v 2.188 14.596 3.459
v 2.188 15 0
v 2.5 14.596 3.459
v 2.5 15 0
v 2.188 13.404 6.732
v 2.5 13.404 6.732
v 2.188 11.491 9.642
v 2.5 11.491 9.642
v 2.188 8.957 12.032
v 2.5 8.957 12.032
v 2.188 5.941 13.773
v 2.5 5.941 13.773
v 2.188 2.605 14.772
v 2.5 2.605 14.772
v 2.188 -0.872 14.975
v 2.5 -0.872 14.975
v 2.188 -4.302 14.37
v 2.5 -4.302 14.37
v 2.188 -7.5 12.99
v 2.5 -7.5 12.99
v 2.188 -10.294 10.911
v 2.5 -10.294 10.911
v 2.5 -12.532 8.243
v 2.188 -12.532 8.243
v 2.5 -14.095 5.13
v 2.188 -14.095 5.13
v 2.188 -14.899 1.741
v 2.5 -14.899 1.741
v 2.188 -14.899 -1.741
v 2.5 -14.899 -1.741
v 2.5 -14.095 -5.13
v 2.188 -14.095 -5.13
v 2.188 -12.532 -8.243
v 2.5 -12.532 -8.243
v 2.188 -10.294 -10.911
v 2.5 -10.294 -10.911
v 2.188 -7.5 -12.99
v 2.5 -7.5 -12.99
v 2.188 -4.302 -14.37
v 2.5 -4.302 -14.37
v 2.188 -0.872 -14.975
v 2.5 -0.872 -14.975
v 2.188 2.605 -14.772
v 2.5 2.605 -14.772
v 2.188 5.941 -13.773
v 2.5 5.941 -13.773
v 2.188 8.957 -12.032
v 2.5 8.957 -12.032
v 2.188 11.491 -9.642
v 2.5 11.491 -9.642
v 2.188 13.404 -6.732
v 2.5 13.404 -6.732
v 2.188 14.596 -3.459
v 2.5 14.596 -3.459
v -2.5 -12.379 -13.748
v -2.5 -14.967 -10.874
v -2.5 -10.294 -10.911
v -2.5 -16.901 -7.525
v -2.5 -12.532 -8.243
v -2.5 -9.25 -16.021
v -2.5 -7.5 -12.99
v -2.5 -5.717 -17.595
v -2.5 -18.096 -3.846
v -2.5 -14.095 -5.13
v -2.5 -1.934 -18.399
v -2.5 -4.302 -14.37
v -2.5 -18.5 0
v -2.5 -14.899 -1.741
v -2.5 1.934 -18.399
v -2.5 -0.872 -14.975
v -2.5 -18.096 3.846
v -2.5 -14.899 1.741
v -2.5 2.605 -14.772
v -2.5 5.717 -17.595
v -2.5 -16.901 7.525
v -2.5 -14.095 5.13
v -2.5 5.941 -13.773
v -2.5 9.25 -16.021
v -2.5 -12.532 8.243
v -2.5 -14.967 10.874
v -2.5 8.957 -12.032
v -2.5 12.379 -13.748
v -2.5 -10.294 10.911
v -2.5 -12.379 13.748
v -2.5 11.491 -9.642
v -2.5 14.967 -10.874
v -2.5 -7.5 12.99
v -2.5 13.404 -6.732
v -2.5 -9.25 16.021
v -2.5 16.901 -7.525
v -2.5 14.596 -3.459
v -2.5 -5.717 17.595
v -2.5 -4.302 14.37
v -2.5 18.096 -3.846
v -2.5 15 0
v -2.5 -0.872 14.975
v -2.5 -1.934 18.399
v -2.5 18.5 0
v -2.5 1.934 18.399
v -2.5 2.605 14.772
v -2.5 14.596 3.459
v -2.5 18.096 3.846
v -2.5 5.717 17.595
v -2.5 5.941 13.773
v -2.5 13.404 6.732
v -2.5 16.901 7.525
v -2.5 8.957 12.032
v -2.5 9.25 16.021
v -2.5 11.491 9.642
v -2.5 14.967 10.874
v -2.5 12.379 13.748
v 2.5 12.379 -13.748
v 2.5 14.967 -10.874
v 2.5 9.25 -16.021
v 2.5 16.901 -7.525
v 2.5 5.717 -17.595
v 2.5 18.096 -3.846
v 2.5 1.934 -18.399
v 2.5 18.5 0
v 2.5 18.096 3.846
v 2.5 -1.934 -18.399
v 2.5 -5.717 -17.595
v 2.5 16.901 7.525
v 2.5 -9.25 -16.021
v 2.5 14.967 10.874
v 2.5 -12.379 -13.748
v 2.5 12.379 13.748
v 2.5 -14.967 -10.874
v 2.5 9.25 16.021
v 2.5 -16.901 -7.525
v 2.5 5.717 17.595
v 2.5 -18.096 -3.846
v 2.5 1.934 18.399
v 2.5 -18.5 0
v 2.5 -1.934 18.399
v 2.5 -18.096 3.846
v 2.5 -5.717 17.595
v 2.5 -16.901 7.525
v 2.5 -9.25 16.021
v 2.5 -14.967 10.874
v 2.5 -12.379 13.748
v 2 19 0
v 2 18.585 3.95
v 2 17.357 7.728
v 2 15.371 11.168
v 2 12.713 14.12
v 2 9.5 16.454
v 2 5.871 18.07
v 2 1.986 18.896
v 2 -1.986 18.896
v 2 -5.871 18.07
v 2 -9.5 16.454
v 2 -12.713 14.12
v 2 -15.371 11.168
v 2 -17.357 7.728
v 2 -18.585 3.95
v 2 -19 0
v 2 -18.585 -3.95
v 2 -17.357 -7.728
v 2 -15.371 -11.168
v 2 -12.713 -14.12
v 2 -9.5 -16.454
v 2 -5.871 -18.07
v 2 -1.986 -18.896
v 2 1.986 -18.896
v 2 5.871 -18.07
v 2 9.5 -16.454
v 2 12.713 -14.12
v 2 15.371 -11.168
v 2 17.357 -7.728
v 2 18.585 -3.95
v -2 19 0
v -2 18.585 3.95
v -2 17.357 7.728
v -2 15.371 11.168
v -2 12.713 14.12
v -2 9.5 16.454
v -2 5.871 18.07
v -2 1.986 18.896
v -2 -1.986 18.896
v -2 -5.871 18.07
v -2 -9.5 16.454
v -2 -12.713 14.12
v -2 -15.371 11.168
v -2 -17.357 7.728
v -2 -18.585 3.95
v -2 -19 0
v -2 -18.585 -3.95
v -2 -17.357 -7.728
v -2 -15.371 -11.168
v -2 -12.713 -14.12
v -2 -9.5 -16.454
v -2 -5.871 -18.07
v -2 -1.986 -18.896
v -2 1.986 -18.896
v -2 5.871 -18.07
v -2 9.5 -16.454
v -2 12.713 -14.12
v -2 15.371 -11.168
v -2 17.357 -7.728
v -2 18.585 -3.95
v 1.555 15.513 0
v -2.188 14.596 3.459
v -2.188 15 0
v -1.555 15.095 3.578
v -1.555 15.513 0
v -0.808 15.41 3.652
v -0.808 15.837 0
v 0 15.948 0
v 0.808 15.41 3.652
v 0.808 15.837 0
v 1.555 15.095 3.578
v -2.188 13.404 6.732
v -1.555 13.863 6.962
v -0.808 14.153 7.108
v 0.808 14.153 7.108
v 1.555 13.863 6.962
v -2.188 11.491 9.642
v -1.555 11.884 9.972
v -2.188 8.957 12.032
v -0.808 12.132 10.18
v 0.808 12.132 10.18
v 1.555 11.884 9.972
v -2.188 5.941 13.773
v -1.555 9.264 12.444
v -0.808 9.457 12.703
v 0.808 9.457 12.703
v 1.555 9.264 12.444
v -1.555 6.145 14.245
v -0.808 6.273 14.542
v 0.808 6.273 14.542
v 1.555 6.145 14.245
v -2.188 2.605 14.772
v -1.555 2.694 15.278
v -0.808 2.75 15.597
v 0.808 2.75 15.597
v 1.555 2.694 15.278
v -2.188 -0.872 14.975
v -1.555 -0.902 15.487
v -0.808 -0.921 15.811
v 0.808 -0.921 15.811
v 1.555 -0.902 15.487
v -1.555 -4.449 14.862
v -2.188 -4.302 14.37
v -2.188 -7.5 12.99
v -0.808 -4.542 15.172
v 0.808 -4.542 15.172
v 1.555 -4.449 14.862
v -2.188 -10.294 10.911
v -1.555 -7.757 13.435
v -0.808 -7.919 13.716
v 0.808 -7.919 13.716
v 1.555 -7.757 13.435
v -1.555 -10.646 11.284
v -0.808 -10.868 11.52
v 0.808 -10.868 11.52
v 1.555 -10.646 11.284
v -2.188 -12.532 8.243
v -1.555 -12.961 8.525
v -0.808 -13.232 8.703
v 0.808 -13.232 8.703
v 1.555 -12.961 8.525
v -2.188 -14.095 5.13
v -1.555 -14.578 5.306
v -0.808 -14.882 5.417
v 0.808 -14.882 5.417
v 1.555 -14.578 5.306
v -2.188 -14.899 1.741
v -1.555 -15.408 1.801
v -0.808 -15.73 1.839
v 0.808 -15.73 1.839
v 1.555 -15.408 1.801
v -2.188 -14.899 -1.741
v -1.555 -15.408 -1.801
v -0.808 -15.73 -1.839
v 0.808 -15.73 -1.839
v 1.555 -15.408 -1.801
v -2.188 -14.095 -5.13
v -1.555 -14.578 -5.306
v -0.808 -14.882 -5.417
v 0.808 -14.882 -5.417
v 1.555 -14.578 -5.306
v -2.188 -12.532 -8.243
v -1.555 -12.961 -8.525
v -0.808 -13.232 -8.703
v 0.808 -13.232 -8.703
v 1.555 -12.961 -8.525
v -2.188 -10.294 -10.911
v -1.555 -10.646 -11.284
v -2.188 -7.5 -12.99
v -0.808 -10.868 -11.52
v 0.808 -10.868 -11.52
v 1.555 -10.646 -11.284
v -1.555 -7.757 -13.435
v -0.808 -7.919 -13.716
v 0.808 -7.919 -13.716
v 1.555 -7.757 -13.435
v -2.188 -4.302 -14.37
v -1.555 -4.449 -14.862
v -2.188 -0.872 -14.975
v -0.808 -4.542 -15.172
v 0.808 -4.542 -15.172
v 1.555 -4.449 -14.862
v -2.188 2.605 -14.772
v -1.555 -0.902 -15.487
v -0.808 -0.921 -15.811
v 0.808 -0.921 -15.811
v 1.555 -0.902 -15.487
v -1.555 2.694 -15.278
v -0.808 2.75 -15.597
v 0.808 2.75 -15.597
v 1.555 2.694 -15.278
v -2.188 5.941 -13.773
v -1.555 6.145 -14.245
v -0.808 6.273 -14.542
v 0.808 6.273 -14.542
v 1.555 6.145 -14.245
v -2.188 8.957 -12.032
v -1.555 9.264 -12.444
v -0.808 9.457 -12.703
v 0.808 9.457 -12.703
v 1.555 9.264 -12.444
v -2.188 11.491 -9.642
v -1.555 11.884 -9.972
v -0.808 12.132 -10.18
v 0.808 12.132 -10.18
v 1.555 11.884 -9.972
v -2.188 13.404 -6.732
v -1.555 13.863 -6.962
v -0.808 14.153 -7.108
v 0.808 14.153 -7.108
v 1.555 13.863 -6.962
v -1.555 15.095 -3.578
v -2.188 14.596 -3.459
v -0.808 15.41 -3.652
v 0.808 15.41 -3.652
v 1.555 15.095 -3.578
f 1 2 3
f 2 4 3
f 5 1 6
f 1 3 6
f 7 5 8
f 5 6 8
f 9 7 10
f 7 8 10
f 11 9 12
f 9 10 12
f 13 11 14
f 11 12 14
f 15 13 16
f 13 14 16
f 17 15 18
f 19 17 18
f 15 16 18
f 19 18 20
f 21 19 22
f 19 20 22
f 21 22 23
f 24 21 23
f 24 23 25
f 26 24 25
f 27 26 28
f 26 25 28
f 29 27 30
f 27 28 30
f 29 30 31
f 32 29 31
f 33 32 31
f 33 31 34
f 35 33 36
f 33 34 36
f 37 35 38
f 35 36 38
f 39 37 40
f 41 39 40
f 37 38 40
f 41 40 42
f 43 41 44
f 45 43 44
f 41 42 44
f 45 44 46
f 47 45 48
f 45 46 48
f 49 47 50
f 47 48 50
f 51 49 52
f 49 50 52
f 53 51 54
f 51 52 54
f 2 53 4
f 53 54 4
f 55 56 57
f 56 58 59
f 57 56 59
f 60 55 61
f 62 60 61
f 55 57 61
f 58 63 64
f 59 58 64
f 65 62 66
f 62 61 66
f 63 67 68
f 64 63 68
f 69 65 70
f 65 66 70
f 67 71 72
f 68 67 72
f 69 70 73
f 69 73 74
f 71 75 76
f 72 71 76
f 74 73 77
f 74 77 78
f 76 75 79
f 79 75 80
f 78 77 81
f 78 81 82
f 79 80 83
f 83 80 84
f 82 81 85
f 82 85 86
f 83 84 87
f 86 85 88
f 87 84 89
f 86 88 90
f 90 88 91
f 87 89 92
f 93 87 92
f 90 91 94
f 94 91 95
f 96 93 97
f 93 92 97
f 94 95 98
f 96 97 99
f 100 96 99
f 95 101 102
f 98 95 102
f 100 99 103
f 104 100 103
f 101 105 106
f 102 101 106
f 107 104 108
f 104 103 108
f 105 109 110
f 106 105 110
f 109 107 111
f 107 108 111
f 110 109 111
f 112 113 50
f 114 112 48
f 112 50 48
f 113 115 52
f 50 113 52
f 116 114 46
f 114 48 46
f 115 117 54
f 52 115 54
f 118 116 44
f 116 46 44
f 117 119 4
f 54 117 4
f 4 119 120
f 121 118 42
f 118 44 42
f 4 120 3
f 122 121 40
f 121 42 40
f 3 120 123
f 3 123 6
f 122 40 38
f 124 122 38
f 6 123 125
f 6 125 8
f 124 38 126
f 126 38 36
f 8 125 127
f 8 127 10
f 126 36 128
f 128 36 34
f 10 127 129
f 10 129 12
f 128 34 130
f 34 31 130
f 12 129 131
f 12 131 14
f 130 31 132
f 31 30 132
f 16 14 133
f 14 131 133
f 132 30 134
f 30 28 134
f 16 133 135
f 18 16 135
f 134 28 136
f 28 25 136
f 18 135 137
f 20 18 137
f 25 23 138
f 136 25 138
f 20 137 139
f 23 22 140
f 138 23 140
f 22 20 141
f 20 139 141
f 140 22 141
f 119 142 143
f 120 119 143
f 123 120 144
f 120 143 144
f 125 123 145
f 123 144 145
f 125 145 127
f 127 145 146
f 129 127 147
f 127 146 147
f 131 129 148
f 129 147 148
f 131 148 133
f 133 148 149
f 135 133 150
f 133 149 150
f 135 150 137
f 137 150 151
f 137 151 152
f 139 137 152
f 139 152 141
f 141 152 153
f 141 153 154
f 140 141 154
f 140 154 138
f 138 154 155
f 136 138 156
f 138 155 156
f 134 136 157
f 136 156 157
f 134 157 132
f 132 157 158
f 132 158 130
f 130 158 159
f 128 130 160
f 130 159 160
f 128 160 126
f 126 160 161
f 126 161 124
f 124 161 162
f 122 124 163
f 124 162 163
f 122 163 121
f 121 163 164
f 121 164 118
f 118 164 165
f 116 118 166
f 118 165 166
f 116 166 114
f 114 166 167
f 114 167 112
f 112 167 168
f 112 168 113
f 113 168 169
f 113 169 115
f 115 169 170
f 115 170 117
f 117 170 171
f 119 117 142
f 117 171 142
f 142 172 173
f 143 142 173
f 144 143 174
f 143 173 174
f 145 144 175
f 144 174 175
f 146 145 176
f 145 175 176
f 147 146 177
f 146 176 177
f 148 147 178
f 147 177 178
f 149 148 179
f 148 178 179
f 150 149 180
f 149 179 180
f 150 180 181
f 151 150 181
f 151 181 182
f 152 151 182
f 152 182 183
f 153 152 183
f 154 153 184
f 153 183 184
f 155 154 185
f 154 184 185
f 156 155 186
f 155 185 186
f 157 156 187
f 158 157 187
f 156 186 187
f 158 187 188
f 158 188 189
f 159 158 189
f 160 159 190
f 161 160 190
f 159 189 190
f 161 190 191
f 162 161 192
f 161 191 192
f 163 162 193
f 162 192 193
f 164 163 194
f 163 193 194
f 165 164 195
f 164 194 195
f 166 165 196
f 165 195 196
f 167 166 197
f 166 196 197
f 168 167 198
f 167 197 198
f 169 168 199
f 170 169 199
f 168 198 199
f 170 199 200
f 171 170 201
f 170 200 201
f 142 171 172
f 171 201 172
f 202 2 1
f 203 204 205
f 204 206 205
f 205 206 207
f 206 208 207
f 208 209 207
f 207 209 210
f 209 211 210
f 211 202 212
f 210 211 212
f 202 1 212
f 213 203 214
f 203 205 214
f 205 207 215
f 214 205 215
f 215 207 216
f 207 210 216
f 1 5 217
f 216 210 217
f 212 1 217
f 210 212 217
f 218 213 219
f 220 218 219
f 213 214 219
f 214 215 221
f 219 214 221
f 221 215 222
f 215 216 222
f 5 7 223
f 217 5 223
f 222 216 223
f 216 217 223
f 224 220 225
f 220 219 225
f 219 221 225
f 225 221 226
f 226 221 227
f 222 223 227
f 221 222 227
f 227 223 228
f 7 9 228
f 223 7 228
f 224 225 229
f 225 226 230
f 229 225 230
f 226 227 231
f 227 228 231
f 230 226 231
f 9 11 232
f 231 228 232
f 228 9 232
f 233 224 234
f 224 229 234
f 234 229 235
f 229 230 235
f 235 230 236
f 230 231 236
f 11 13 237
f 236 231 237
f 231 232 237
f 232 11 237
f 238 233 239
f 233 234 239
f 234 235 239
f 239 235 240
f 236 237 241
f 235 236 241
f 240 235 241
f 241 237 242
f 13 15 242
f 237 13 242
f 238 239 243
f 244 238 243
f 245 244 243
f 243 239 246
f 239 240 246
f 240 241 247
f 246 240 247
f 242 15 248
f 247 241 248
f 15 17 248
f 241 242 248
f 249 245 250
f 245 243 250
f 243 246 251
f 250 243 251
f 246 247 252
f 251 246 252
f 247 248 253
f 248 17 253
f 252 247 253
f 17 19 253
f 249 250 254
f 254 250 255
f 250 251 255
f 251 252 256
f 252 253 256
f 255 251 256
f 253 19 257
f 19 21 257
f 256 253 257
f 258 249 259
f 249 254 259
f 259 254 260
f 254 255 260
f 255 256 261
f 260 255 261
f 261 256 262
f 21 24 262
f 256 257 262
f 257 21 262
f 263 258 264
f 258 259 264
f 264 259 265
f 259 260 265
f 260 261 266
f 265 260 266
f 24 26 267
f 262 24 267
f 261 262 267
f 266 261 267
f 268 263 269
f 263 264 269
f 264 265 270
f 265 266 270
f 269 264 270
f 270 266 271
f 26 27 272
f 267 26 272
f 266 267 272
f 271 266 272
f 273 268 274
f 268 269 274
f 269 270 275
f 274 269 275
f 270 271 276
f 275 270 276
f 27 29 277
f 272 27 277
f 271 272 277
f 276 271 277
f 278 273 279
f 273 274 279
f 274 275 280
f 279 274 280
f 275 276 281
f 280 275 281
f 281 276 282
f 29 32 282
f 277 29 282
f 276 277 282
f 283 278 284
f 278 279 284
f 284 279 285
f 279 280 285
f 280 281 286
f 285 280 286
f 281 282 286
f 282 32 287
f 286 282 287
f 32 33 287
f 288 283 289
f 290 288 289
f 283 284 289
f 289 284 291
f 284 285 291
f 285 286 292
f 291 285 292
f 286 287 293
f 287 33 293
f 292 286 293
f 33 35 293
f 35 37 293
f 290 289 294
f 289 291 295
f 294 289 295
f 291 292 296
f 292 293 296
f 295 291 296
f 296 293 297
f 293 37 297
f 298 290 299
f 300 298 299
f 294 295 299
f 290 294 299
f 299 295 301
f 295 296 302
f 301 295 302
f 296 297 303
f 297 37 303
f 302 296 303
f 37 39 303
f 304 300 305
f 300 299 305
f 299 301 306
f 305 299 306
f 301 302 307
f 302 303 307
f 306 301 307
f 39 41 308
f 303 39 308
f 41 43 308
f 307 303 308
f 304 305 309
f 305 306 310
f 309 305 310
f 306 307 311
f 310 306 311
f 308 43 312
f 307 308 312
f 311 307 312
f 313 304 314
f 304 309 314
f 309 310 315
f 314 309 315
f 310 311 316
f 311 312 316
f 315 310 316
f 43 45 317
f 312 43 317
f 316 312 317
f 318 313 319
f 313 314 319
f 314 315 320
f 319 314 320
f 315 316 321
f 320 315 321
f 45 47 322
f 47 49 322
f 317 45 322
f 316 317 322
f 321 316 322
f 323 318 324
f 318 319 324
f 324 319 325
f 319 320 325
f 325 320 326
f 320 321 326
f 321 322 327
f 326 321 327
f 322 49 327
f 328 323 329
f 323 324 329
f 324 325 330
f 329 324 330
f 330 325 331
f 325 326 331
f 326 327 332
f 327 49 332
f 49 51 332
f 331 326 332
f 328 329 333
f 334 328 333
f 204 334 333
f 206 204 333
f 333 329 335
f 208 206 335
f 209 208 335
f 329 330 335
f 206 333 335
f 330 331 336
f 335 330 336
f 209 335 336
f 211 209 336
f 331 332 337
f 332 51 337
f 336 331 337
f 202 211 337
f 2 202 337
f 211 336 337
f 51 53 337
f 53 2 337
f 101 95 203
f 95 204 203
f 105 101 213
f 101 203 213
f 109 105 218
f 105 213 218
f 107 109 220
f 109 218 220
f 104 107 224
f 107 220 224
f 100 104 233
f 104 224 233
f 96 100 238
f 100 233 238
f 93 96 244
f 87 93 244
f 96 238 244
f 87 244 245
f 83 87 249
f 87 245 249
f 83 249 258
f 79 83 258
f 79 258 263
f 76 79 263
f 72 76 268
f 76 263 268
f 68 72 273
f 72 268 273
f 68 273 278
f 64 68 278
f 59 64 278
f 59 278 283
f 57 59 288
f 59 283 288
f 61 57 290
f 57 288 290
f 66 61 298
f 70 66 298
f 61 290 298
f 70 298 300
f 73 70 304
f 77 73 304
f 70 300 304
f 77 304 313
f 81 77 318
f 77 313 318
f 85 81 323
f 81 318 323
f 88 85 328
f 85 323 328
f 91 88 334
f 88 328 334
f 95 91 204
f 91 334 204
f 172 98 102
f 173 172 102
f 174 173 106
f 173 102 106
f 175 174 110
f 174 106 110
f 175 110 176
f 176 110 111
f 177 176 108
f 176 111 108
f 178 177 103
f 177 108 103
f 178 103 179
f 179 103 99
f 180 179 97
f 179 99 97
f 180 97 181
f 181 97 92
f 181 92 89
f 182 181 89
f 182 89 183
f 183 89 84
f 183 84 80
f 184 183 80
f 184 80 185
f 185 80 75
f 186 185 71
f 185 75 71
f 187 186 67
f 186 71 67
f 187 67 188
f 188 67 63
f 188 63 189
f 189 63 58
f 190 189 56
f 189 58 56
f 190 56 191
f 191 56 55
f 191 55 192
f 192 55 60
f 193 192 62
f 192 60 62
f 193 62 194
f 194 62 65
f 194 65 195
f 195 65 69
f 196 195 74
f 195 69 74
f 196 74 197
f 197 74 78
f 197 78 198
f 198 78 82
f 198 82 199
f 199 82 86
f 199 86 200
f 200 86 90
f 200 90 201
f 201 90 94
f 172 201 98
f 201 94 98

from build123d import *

# Parameters (mm, degrees)
CHAMFER2_SIZE = 0.5


with BuildPart() as part:
    # Sketch1 → Revolve2 (revolve)
    with BuildSketch(Plane.XY):
        with BuildLine():
            Line((-2.5, 15), (-2.188493664, 15))
            ThreePointArc((-2.188493664, 15), (0, 15.948050809), (2.188493664, 15))
            Line((2.188493664, 15), (2.5, 15))
            Line((2.5, 15), (2.5, 19))
            Line((2.5, 19), (-2.5, 19))
            Line((-2.5, 19), (-2.5, 15))
        make_face()
    revolve(axis=Axis((-21.395056223, 0, 0), (1, 0, 0)))

    # Chamfer2
    chamfer2_edges = [part.edges().sort_by_distance(p)[0] for p in [
        (-2.5, -19, 0),
        (2.5, -19, 0),
    ]]
    chamfer(chamfer2_edges, length=CHAMFER2_SIZE)


solid = part.part
